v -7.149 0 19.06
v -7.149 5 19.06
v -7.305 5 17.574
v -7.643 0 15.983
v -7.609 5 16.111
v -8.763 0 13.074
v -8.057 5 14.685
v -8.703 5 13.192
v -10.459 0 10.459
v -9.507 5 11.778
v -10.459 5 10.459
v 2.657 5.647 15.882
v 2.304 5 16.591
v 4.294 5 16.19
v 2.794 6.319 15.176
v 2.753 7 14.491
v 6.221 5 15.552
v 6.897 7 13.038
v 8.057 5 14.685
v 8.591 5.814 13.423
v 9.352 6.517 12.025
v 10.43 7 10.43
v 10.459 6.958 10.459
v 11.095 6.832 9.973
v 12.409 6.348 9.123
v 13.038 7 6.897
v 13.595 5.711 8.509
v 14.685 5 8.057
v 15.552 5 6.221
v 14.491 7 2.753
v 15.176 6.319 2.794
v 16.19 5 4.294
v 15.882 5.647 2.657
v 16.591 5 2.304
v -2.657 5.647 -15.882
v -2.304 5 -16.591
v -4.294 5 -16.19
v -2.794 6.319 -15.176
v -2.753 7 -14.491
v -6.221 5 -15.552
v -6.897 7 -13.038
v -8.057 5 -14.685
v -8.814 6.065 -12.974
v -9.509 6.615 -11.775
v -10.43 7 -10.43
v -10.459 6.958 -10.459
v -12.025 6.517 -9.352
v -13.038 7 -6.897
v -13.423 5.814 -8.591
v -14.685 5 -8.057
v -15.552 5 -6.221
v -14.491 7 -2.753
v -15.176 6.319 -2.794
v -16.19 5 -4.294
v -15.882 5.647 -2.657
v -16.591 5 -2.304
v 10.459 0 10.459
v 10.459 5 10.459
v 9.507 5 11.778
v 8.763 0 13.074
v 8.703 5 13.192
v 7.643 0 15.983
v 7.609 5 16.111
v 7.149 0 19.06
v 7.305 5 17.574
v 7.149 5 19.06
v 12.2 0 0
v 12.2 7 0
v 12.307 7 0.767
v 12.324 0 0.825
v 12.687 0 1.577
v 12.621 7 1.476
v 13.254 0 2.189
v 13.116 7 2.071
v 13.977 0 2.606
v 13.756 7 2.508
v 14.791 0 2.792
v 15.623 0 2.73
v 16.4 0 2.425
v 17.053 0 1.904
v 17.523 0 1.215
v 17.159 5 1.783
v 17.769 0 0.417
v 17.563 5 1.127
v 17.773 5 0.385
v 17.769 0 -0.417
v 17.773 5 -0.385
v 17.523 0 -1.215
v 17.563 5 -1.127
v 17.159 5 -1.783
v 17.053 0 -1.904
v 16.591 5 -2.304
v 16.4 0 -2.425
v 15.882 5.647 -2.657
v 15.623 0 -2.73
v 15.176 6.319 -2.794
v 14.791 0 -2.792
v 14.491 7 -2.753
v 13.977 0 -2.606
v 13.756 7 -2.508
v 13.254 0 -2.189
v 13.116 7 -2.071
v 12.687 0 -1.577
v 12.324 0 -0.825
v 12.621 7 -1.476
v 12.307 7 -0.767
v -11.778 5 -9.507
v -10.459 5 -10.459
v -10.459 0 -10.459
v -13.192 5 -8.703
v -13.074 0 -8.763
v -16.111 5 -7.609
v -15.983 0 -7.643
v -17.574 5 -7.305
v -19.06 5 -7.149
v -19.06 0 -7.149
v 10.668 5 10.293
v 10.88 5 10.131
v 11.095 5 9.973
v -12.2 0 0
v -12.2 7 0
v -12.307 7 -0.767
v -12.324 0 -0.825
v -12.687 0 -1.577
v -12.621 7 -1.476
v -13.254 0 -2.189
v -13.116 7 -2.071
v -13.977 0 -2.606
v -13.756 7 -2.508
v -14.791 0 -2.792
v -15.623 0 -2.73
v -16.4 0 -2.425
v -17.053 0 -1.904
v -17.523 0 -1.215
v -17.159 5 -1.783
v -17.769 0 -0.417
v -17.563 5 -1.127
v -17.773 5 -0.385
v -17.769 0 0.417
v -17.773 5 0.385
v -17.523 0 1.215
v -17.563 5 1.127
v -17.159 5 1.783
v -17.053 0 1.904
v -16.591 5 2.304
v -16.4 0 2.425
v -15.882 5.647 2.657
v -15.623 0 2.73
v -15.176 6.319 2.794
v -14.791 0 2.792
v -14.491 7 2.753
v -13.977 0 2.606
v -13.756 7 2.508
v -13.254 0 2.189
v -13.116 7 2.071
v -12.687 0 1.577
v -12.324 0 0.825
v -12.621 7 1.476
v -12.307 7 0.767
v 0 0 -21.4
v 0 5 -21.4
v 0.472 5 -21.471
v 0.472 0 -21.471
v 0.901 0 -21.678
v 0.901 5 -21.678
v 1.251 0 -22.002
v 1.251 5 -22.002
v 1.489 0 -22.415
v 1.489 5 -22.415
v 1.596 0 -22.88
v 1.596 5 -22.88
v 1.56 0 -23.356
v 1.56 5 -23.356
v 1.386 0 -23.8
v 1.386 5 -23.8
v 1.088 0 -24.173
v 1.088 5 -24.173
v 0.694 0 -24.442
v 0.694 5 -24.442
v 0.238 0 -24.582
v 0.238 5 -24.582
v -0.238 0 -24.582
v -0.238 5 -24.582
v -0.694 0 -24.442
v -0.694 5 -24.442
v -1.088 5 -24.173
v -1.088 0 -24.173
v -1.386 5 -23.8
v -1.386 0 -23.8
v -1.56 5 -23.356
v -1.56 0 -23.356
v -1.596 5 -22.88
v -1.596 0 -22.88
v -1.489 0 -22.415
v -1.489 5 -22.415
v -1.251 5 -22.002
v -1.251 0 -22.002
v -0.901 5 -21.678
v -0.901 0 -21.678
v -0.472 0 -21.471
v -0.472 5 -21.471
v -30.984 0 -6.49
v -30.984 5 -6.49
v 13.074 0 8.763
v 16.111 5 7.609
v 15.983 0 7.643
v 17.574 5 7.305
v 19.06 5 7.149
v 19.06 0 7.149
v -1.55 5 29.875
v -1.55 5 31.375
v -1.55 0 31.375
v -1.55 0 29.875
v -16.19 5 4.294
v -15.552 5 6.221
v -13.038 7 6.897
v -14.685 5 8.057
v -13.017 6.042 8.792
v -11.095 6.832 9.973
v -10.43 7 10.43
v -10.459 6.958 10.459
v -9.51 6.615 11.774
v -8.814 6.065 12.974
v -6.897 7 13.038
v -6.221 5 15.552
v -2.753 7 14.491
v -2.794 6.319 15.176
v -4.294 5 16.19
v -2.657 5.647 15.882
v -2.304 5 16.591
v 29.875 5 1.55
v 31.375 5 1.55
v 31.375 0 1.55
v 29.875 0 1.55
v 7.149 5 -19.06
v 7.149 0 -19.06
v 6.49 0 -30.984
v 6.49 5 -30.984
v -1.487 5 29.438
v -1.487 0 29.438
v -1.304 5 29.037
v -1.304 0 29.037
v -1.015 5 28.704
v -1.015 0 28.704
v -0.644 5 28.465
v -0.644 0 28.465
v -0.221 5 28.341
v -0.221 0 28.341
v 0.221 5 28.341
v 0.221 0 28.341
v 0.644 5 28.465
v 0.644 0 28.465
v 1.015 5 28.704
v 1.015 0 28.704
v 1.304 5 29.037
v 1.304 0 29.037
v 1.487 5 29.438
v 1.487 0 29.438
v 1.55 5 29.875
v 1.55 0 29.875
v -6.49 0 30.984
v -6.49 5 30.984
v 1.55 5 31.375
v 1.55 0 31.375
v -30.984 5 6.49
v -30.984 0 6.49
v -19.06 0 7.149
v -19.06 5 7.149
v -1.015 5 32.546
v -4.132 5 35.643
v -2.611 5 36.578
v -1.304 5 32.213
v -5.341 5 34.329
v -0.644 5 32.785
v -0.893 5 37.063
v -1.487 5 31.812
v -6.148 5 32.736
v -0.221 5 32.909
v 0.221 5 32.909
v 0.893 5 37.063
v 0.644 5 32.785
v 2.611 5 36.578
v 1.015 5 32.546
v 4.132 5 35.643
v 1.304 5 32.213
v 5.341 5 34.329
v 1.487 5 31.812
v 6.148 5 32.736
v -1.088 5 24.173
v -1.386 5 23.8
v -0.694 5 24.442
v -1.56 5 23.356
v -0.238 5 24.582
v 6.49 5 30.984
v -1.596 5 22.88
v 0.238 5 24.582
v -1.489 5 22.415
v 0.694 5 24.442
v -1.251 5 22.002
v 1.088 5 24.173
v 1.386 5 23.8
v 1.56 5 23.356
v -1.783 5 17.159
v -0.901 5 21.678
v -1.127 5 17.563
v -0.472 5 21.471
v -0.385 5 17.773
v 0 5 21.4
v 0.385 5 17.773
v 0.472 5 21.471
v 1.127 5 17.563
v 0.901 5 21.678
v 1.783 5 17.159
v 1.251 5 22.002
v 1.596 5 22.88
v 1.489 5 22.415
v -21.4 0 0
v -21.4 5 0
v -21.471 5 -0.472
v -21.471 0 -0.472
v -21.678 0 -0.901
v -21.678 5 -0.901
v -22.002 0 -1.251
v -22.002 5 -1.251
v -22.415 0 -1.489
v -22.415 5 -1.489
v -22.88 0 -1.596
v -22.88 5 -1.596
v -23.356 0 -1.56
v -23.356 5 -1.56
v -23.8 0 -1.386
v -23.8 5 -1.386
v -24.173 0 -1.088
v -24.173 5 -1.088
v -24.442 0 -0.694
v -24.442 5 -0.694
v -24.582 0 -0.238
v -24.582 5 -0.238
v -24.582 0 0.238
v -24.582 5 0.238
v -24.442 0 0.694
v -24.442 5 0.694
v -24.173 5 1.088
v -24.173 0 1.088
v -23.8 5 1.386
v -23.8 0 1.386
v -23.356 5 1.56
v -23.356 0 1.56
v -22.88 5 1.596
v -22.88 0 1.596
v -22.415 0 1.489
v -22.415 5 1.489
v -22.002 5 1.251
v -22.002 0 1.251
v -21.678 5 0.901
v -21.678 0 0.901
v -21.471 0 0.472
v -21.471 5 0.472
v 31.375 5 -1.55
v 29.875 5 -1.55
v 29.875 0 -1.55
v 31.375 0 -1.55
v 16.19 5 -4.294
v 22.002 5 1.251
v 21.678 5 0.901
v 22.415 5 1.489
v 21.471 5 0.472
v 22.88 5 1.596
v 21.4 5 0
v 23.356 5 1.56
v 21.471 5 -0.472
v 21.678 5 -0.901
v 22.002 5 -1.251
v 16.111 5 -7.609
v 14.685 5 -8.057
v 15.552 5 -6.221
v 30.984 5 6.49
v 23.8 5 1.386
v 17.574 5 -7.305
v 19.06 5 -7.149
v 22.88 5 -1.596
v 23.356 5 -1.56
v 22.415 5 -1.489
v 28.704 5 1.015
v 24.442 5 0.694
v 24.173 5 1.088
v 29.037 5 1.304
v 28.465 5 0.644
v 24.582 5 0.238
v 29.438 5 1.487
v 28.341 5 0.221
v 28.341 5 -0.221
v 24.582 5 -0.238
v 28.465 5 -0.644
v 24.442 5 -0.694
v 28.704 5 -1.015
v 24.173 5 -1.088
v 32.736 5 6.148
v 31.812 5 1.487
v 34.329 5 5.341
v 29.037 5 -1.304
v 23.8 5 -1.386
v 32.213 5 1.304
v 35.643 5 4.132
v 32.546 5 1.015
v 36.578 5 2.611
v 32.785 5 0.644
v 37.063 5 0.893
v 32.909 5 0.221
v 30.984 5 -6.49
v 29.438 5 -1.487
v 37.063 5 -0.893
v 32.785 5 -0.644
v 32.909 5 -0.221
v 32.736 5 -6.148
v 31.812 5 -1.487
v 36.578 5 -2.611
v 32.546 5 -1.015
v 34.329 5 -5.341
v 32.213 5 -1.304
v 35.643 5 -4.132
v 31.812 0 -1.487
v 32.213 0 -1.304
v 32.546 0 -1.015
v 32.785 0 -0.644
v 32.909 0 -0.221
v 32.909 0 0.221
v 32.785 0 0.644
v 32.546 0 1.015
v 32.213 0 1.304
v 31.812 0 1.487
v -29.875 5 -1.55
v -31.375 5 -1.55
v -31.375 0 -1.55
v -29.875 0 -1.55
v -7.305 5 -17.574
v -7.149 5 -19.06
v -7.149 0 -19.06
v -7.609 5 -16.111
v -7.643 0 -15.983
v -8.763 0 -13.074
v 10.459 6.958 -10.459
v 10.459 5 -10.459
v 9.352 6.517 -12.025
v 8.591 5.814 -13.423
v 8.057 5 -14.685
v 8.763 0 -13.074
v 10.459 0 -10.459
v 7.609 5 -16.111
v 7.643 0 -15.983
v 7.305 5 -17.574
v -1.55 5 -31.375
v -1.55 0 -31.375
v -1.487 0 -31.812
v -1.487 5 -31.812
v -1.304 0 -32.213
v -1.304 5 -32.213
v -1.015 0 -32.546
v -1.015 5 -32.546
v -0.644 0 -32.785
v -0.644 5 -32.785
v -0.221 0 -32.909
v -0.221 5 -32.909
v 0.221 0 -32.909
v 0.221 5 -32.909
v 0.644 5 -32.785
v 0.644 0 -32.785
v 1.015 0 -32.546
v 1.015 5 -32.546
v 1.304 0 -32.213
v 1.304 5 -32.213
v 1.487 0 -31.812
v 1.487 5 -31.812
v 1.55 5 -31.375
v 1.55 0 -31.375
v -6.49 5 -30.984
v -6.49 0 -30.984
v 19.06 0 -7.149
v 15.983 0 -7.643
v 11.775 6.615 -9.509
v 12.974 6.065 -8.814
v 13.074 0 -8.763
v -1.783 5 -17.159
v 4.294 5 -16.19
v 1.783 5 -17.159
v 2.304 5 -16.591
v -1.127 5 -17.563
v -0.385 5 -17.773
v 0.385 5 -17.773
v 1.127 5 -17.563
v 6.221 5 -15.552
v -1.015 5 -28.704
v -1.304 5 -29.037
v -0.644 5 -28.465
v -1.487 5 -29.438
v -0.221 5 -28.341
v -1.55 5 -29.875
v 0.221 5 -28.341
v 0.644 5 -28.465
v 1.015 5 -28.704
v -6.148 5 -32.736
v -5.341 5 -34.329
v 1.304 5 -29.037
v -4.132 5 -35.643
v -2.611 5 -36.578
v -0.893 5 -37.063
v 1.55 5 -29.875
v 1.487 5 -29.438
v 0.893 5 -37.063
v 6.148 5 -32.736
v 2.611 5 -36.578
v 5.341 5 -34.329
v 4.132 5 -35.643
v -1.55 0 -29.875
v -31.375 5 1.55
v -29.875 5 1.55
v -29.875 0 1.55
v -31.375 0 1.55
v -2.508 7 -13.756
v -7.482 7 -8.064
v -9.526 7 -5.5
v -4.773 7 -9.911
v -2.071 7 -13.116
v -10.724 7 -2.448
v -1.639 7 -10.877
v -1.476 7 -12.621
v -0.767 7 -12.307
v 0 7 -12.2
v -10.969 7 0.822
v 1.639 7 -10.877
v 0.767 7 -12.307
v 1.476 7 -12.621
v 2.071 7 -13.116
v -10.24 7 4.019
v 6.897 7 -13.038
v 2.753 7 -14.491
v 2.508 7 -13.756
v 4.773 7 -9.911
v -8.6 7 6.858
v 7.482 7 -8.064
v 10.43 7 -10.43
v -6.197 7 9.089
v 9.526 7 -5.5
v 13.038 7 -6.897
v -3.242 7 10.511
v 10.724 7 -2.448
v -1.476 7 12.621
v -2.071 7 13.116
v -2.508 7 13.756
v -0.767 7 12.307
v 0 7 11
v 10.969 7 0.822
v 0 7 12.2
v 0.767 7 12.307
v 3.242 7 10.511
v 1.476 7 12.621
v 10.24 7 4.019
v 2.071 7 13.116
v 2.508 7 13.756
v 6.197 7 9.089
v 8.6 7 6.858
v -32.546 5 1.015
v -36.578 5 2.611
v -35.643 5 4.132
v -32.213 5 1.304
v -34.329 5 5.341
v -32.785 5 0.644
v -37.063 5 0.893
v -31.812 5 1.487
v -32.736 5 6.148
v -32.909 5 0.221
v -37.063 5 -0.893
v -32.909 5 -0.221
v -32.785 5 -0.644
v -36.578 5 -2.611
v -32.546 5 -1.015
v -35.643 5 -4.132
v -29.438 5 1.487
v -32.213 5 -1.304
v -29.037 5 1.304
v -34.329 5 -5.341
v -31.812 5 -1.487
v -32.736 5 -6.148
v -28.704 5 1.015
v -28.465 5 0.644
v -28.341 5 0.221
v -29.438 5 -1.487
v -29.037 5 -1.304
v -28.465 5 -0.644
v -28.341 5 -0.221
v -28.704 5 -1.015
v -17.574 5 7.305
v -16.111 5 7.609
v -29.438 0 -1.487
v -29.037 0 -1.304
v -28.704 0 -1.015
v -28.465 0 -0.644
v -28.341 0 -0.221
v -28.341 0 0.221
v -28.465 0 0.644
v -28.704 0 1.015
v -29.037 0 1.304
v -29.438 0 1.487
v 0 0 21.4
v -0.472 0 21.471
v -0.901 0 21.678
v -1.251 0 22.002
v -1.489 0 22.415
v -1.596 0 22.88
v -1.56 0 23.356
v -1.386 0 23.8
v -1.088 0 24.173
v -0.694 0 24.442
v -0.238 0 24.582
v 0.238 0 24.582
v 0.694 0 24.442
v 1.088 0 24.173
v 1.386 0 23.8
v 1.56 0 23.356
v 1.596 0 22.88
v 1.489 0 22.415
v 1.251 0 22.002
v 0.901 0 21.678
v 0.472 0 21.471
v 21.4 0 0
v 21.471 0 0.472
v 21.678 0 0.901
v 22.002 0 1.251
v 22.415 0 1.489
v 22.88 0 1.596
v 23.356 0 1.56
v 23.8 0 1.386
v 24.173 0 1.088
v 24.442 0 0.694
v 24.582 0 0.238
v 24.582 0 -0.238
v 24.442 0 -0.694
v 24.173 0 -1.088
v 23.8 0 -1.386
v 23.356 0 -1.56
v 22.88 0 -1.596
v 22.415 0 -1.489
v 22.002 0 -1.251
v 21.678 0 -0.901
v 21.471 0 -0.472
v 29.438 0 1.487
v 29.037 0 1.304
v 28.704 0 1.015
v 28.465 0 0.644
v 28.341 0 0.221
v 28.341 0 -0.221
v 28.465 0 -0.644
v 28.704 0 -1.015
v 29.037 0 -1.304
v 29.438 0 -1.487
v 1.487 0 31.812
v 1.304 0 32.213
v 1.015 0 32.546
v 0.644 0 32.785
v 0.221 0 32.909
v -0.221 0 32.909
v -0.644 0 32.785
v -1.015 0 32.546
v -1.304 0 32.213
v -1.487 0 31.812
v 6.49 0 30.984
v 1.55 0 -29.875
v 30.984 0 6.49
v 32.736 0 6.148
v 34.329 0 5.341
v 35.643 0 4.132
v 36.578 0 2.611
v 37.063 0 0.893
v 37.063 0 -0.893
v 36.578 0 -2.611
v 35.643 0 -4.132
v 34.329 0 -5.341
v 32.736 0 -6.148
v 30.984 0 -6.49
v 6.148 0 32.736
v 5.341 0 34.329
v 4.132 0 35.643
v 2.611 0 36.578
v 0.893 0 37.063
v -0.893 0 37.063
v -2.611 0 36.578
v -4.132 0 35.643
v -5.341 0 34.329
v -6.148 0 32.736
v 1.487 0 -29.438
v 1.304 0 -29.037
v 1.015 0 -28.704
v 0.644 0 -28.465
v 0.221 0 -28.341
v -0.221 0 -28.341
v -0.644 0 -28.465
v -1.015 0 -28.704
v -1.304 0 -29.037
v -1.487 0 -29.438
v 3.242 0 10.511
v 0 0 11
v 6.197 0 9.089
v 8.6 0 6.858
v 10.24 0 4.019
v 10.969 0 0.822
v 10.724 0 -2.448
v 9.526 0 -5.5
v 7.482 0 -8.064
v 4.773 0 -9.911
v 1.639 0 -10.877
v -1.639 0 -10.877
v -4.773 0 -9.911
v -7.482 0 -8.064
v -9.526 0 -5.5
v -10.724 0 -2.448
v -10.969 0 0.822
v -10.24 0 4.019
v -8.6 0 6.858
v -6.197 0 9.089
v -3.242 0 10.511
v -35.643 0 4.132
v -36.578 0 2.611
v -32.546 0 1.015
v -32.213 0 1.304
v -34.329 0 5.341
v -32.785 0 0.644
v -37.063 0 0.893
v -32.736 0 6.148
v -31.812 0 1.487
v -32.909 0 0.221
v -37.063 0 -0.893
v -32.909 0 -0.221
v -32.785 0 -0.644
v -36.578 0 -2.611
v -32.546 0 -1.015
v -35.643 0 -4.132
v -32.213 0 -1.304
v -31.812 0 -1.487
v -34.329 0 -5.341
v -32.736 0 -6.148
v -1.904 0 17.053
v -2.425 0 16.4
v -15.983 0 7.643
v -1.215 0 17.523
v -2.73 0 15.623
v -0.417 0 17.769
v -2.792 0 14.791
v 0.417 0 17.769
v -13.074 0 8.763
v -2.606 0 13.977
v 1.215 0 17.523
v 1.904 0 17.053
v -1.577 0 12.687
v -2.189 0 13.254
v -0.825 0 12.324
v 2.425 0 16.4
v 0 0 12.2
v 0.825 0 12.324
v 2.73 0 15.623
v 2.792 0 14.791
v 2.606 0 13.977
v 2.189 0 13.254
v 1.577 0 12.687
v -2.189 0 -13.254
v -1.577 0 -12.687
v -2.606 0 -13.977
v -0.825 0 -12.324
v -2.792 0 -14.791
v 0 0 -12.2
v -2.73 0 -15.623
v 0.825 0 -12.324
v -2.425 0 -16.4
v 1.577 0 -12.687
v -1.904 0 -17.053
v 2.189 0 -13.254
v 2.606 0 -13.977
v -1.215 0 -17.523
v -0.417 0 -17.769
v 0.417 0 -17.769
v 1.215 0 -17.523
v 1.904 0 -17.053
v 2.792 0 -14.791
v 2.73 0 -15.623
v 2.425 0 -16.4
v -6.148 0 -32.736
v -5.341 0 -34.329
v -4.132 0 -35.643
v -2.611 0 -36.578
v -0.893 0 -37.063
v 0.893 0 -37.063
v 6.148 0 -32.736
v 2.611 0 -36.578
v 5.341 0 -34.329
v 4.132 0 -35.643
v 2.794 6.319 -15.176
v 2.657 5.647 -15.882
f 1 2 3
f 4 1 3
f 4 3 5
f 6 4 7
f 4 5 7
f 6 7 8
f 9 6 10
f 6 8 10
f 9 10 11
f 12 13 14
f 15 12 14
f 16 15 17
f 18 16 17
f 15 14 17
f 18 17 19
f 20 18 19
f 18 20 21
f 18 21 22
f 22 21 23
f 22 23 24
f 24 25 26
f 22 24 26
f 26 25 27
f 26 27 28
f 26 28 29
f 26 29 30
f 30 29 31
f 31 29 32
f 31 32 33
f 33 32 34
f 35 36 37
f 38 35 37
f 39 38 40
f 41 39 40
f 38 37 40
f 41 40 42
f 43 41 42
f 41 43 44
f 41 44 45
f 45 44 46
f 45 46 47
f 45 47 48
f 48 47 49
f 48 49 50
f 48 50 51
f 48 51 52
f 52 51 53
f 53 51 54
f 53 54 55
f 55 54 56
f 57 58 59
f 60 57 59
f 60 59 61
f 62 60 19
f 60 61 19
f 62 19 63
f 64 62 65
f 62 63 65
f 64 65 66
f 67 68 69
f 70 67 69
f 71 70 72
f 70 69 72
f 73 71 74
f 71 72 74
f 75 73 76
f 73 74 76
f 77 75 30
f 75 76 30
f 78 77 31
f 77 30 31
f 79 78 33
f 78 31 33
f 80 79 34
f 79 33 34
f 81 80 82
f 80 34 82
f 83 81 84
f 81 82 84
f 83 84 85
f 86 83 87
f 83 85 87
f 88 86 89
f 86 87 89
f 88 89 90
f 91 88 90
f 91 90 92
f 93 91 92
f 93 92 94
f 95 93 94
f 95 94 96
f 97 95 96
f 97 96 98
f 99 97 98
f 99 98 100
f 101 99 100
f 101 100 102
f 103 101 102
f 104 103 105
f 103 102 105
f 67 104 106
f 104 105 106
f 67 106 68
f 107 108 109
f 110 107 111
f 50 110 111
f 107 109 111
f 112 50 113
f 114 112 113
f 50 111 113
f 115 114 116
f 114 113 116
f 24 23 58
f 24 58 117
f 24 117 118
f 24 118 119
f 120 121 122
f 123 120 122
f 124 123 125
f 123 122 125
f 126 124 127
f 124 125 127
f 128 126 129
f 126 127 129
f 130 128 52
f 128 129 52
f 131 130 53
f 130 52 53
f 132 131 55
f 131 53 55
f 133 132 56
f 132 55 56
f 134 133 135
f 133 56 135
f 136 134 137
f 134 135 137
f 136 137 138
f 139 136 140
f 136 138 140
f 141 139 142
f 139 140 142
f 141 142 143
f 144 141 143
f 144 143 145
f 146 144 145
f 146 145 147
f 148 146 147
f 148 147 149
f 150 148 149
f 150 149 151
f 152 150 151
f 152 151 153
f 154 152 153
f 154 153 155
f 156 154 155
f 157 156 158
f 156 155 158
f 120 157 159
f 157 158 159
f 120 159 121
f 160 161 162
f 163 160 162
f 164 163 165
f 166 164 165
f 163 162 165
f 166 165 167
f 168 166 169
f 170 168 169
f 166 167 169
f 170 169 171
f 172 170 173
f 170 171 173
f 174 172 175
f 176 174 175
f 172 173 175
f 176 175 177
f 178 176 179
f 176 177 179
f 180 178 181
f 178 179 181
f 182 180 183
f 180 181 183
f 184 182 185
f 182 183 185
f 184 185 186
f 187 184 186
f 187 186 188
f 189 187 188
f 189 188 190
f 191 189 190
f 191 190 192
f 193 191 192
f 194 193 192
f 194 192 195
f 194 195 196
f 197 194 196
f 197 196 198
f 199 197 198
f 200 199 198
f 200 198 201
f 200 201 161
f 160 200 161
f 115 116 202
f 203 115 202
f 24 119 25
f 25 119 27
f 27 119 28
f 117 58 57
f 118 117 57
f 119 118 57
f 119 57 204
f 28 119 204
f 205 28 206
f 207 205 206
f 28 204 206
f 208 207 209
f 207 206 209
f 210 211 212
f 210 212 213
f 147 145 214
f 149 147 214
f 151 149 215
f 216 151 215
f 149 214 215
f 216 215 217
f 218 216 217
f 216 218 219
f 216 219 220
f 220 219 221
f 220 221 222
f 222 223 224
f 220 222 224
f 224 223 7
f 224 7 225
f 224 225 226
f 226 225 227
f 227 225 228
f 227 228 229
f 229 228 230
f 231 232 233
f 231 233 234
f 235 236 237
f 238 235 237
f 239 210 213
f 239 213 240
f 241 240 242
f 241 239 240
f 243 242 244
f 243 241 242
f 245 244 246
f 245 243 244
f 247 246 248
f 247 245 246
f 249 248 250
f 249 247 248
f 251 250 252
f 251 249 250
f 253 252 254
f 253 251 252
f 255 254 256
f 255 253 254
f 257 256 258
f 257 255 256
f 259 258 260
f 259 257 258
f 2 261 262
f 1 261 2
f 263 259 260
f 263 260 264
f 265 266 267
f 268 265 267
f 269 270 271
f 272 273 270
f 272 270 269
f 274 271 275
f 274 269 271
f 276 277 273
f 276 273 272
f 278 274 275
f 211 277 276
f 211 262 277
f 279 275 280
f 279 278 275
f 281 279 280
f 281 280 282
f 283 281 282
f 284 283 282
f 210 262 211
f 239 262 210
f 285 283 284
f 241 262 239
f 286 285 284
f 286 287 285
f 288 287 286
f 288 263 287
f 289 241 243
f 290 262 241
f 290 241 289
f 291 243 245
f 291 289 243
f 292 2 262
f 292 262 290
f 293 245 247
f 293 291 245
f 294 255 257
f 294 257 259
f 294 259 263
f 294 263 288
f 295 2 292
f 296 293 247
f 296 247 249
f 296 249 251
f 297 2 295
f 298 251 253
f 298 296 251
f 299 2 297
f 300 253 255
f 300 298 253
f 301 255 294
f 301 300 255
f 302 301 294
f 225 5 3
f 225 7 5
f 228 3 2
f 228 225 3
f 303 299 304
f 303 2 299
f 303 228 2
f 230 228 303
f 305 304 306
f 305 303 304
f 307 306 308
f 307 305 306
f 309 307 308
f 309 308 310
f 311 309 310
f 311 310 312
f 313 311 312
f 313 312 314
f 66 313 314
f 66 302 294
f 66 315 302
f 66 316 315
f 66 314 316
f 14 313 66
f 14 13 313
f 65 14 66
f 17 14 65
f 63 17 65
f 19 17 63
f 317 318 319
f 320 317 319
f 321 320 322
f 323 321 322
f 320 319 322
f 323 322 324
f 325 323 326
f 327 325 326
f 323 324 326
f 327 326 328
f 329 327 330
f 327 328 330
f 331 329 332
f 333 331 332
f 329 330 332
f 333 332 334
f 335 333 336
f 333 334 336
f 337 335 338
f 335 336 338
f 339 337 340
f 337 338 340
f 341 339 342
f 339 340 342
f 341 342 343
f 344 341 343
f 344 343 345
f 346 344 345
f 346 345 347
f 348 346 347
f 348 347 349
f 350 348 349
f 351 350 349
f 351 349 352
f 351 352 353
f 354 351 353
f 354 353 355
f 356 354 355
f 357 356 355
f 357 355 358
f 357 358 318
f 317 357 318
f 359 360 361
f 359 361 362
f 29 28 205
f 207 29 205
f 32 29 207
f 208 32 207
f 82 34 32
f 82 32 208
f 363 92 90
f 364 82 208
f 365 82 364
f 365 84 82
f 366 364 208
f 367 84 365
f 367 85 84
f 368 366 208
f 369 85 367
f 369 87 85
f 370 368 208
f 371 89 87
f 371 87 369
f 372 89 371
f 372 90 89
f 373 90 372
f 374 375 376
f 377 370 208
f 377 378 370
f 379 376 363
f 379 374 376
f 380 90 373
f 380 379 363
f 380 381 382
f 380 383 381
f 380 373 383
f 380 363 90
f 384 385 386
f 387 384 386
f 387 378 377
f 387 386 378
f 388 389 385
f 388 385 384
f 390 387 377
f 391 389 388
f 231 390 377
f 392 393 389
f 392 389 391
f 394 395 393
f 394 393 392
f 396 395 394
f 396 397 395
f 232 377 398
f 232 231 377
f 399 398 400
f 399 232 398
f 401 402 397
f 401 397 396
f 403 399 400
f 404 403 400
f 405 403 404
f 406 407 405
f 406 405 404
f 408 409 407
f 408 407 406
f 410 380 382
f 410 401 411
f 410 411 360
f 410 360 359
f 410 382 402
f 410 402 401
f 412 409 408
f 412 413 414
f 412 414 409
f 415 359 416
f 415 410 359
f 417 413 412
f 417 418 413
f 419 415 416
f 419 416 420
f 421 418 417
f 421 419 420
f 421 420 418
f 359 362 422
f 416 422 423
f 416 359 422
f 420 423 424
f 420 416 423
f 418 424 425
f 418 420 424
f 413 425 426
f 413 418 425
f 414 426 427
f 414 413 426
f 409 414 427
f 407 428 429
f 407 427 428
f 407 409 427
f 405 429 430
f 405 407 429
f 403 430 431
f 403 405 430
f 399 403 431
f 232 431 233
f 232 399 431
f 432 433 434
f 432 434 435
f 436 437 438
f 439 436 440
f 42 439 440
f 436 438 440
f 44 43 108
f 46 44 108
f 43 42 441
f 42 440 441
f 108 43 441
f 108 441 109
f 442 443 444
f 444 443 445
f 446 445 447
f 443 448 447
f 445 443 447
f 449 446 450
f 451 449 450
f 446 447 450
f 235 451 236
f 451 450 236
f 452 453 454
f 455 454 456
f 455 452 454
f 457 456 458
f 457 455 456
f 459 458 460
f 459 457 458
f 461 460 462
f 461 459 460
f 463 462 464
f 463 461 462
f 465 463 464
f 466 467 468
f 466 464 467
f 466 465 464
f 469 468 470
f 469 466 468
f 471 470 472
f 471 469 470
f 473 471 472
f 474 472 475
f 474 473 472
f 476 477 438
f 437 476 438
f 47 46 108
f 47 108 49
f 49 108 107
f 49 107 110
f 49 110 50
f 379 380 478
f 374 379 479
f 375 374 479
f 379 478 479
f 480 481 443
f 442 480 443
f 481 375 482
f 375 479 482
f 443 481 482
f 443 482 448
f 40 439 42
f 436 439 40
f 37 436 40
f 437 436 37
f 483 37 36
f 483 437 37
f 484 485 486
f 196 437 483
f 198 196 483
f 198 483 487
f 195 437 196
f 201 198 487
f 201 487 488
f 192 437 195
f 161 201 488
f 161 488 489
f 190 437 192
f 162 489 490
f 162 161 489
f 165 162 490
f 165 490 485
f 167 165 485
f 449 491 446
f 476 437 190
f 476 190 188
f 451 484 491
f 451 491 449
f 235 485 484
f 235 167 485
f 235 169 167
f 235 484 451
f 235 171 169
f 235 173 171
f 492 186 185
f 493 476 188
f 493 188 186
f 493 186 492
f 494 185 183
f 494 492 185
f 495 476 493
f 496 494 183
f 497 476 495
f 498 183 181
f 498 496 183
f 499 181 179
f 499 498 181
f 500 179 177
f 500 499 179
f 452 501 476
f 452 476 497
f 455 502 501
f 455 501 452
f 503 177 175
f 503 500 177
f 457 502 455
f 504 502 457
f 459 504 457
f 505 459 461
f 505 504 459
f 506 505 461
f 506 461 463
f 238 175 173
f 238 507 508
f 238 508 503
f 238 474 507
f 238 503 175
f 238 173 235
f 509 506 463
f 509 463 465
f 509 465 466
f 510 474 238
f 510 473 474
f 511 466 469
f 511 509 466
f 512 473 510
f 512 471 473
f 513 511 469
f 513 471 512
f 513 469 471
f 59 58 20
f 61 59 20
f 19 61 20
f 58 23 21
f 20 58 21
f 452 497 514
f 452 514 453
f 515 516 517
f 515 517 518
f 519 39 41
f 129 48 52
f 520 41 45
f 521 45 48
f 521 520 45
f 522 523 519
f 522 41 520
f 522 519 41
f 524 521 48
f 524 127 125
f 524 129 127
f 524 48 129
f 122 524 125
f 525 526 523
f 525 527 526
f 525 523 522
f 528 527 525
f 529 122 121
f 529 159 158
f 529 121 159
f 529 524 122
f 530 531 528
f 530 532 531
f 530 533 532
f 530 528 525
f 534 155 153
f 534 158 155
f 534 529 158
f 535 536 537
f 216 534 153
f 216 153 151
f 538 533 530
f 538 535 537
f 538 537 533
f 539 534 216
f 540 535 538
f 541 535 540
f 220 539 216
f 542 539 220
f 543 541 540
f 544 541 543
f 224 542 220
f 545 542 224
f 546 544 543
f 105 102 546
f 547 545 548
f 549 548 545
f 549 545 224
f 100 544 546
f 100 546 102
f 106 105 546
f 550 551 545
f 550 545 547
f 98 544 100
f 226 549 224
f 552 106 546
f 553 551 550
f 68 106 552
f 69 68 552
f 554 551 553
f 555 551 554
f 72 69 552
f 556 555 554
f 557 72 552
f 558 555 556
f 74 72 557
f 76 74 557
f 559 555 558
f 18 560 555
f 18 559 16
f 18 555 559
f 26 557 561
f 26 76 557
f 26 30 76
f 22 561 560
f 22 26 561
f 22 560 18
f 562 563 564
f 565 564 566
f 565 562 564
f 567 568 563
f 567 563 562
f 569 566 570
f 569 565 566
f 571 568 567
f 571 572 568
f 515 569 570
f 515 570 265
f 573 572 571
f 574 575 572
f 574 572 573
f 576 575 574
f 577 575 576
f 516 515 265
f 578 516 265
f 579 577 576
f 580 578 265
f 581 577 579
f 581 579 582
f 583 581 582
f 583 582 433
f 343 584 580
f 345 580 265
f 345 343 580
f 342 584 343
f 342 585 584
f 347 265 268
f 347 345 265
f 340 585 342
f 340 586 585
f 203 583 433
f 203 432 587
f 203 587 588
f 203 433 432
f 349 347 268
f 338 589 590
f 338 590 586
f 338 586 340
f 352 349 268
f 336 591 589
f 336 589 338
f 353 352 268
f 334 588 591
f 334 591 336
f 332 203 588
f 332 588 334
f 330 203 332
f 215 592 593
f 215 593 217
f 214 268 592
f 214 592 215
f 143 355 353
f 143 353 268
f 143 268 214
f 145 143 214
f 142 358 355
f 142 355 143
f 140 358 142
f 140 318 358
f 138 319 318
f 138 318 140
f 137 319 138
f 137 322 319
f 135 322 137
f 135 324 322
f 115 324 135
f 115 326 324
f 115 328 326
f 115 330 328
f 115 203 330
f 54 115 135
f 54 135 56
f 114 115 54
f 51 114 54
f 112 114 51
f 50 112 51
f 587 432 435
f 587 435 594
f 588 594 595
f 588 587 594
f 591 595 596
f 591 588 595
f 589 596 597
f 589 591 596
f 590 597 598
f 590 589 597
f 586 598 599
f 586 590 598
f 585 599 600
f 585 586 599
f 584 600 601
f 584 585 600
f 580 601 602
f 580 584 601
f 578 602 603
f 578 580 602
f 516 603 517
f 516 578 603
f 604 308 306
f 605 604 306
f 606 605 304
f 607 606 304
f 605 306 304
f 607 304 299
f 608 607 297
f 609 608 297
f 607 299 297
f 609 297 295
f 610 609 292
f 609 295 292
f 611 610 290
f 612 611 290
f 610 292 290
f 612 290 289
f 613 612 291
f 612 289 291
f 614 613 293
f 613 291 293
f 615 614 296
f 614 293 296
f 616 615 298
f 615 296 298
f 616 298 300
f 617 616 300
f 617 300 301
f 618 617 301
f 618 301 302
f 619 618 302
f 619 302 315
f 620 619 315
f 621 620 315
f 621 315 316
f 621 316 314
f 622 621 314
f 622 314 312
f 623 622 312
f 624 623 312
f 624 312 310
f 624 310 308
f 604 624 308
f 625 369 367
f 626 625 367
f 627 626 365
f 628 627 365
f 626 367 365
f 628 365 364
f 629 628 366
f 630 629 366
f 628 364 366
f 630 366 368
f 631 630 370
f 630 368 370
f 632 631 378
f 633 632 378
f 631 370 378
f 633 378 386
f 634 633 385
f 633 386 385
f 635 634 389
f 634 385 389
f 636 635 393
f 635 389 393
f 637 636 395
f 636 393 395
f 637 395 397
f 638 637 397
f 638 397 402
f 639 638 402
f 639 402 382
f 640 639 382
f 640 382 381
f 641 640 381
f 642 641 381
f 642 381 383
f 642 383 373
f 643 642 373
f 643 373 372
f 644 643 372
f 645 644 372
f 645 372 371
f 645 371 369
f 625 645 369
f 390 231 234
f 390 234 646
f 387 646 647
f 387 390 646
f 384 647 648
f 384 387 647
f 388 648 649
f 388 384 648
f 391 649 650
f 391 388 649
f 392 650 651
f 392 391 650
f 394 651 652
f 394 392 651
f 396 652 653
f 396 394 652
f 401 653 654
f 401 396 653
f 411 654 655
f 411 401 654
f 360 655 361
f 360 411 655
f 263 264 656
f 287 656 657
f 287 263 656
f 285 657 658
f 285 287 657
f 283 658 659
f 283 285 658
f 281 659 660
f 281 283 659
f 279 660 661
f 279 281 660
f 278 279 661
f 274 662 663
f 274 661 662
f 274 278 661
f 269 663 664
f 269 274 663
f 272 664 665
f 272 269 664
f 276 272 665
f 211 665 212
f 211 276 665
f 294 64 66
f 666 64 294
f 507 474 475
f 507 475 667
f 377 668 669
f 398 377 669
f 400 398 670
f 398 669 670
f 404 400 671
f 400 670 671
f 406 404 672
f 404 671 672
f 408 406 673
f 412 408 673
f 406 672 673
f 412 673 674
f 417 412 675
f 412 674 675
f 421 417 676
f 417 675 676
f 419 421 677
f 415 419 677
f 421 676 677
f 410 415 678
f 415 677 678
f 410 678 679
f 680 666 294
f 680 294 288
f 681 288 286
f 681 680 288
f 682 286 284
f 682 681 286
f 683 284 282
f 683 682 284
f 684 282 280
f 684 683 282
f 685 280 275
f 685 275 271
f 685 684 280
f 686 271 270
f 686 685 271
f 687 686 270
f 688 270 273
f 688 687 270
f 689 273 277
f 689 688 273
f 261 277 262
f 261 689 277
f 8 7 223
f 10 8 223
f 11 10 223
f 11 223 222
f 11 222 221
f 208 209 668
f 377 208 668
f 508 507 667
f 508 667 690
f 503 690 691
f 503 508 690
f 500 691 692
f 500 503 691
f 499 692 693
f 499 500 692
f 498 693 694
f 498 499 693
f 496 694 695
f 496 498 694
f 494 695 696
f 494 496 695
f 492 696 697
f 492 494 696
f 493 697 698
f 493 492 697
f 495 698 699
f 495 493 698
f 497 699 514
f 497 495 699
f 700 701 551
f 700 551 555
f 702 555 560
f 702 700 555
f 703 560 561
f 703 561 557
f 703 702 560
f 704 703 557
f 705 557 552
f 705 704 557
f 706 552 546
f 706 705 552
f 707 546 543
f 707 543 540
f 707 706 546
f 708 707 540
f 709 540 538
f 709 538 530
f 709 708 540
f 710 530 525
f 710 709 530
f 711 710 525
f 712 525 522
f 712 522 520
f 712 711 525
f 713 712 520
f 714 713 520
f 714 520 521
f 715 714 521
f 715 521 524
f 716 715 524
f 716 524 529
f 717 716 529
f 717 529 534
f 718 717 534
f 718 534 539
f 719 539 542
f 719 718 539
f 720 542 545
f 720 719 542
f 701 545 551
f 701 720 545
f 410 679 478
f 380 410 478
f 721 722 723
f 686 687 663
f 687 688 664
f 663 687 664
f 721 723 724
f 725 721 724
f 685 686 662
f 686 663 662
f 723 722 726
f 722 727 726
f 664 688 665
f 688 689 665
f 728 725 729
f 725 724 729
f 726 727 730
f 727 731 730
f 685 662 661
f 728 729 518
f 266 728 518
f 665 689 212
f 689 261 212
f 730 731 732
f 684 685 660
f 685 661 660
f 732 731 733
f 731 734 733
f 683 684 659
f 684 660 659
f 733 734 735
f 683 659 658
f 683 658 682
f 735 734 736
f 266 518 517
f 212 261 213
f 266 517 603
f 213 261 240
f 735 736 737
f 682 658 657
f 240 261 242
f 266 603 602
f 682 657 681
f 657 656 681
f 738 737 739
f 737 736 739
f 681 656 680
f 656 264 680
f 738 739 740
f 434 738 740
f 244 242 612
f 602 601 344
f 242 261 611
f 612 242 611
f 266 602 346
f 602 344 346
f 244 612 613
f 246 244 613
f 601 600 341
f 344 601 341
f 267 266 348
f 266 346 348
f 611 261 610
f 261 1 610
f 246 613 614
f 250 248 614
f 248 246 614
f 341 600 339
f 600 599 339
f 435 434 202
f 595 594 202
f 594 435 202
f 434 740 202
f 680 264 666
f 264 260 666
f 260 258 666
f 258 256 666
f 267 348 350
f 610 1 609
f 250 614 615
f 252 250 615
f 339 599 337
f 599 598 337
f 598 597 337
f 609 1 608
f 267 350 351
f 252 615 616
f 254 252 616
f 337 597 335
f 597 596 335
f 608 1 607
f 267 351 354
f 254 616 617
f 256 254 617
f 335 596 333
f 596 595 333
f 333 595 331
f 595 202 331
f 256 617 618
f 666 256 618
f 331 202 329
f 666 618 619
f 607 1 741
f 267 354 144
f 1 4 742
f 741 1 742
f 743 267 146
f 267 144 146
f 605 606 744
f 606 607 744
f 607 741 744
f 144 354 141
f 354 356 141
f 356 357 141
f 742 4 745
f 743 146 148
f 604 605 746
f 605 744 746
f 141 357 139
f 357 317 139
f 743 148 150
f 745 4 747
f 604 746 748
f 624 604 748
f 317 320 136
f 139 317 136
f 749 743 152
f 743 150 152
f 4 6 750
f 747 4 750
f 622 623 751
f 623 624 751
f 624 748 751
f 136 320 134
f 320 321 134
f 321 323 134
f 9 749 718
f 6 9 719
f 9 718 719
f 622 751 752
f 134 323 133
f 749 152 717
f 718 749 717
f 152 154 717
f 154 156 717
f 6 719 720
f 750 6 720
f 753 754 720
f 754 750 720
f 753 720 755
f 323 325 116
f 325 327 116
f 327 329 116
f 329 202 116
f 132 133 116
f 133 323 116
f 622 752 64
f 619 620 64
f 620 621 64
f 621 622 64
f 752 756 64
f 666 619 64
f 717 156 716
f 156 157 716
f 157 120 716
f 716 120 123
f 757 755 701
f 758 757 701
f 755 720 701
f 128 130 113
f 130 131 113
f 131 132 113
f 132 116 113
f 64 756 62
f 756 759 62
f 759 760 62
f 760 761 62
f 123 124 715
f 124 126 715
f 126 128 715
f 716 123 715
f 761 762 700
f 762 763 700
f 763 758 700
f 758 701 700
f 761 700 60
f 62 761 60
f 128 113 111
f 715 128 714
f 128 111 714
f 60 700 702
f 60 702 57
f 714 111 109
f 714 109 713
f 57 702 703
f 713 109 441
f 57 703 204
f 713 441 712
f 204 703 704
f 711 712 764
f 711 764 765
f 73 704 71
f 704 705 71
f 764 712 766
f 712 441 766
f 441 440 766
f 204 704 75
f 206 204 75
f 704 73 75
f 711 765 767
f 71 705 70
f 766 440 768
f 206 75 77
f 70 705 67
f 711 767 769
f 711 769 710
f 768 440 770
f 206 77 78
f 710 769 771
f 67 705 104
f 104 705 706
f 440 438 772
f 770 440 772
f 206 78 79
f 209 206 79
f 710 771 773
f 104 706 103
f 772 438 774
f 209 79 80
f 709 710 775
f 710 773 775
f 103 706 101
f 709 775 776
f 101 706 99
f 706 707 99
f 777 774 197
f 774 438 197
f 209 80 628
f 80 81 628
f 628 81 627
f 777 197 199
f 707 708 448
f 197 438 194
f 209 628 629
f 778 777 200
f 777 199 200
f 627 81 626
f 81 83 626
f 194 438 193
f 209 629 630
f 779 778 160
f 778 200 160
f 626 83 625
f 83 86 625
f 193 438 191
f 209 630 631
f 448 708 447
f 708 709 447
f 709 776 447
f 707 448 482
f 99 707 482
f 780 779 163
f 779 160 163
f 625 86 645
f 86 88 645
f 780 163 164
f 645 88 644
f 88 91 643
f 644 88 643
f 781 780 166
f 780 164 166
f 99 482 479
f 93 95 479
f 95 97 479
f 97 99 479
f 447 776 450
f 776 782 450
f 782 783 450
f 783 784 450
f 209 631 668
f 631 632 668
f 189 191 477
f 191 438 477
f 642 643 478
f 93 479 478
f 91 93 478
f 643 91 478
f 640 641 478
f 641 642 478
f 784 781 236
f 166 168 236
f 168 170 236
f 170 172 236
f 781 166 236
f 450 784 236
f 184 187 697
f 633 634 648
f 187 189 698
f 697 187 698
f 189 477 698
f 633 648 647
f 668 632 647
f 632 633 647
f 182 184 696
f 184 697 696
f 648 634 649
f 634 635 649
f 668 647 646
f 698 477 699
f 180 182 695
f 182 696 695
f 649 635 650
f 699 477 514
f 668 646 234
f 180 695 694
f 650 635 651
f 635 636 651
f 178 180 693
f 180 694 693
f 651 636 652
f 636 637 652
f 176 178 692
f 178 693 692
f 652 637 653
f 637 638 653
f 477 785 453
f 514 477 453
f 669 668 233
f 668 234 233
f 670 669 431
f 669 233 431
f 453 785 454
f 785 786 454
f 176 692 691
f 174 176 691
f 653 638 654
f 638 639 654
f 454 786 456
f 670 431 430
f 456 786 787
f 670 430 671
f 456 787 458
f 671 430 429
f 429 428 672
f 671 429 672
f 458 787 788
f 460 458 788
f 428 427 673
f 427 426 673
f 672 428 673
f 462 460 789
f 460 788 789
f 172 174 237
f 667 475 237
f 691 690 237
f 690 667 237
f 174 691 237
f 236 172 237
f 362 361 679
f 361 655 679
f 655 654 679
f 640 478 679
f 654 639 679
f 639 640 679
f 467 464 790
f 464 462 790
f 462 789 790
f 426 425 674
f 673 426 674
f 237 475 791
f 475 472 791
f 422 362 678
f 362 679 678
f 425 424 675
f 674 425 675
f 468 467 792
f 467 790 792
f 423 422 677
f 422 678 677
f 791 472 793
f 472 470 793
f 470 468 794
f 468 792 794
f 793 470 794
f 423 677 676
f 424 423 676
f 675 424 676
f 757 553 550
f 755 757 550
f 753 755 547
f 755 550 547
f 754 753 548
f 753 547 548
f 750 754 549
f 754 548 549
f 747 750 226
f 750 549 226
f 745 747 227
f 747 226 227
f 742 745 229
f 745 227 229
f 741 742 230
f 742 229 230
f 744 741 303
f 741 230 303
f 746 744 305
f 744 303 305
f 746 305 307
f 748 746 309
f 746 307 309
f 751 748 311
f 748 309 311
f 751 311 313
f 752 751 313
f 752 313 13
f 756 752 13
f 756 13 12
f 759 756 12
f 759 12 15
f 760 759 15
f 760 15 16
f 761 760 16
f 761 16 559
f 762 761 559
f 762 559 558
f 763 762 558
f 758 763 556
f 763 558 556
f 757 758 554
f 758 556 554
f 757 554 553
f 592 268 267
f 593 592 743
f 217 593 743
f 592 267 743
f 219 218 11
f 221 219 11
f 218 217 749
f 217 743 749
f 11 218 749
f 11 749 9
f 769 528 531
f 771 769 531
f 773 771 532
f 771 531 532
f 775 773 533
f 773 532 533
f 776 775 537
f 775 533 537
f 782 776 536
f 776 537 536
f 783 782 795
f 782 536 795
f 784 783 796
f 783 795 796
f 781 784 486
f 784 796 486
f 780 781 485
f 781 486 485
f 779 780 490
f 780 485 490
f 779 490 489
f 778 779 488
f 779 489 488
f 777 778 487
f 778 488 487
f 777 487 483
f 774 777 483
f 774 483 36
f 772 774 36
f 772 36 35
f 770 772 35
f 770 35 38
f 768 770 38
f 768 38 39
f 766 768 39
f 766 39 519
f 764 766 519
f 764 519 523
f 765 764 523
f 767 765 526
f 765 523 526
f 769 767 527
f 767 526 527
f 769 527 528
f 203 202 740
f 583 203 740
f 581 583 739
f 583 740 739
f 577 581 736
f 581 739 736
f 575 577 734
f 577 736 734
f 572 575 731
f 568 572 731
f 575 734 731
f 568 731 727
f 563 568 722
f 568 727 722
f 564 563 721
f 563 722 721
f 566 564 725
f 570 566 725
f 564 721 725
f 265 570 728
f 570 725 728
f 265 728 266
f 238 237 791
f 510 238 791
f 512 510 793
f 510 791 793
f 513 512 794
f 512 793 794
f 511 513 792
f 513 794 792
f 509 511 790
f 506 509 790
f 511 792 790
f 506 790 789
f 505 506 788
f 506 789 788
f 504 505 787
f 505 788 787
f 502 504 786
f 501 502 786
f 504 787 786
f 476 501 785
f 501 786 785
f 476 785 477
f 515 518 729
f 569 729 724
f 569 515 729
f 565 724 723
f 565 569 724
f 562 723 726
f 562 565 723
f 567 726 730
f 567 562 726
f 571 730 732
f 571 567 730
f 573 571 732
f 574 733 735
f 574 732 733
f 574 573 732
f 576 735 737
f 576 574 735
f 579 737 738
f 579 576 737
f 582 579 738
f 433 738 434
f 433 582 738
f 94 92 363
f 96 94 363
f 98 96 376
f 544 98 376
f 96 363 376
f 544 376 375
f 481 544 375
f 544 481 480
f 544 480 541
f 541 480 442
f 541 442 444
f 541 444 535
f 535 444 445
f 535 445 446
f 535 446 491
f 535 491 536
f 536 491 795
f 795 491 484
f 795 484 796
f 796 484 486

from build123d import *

# Parameters (mm, degrees)
SKETCH1_R           = 14.75
SKETCH1_R_2         = 11
BOSS_EXTRUDE1_DEPTH = 7
SKETCH5_R           = 6.5
BOSS_EXTRUDE3_DEPTH = 5
FILLET2_R           = 15
CIRPATTERN2_DEPTH   = 5
CHAMFER2_SIZE       = 2
CUT_EXTRUDE3_REACH  = 54.74
CIRPATTERN4_COUNT   = 4
CUT_EXTRUDE4_REACH  = 54.967
SKETCH9_R           = 2.8
CIRPATTERN5_COUNT   = 4
CUT_EXTRUDE5_REACH  = 54.74
SKETCH10_R          = 1.6
CIRPATTERN6_COUNT   = 4


# Read off the part's stored shape, not the designer's step: CirPattern2
with BuildPart() as part:
    # Sketch1 → Boss-Extrude1 (new body)
    with BuildSketch(Plane(origin=(0, 0, 0), x_dir=(1, 0, 0), z_dir=(0, 1, 0))):
        with Locations(Location((0, 0, 0), (0, 0, 270))):
            Circle(SKETCH1_R)
        with Locations(Location((0, 0, 0), (0, 0, 270))):
            Circle(SKETCH1_R_2, mode=Mode.SUBTRACT)
    extrude(amount=BOSS_EXTRUDE1_DEPTH)

    # Sketch5 → Boss-Extrude3 (add)
    with BuildSketch(Plane.XZ):
        with BuildLine():
            ThreePointArc((6.5, 30.625), (-0.17931828, 24.127473936), (-6.49010614, 30.983500062))
            Line((-6.49010614, 30.983500062), (-7.5, 12.700885796))
            ThreePointArc((-7.5, 12.700885796), (0, 14.75), (7.5, 12.700885796))
            Line((7.5, 12.700885796), (6.49010614, 30.983500062))
            ThreePointArc((6.49010614, 30.983500062), (6.497526064, 30.80431828), (6.5, 30.625))
        make_face()
        with Locations((0, 30.625)):
            Circle(SKETCH5_R)
    extrude(amount=-BOSS_EXTRUDE3_DEPTH)

    # Fillet2
    fillet2_edges = [part.edges().sort_by_distance(p)[0] for p in [
        (7.5, 2.5, 12.700885796),
        (-7.5, 2.5, 12.700885796),
    ]]
    fillet(fillet2_edges, radius=FILLET2_R)

    # CirPattern2 outline → CirPattern2 (add)
    with BuildSketch(Plane(origin=(0, 0, 0), x_dir=(1, 0, 0), z_dir=(0, 1, 0))):
        with BuildLine():
            Line((-30.983500062, -6.49010614), (-19.060050189, -7.14873289))
            ThreePointArc((-19.060050189, -7.14873289), (-14.499104834, -8.127089257), (-10.459249152, -10.459249152))
            ThreePointArc((-10.459249152, -10.459249152), (-10.710685451, -10.156332582), (-10.969984482, -9.860118684))
            ThreePointArc((-10.969984482, -9.860118684), (0, 14.75), (10.969984482, -9.860118684))
            ThreePointArc((10.969984482, -9.860118684), (10.710685451, -10.156332582), (10.459249152, -10.459249152))
            ThreePointArc((10.459249152, -10.459249152), (14.499104834, -8.127089257), (19.060050189, -7.14873289))
            Line((19.060050189, -7.14873289), (30.983500062, -6.49010614))
            ThreePointArc((30.983500062, -6.49010614), (37.125, 0), (30.983500062, 6.49010614))
            Line((30.983500062, 6.49010614), (19.060050189, 7.14873289))
            ThreePointArc((19.060050189, 7.14873289), (14.499104834, 8.127089257), (10.459249152, 10.459249152))
            ThreePointArc((10.459249152, 10.459249152), (8.127089257, 14.499104834), (7.14873289, 19.060050189))
            Line((7.14873289, 19.060050189), (6.49010614, 30.983500062))
            ThreePointArc((6.49010614, 30.983500062), (0, 37.125), (-6.49010614, 30.983500062))
            Line((-6.49010614, 30.983500062), (-7.14873289, 19.060050189))
            ThreePointArc((-7.14873289, 19.060050189), (-8.127089257, 14.499104834), (-10.459249152, 10.459249152))
            ThreePointArc((-10.459249152, 10.459249152), (-14.499104834, 8.127089257), (-19.060050189, 7.14873289))
            Line((-19.060050189, 7.14873289), (-30.983500062, 6.49010614))
            ThreePointArc((-30.983500062, 6.49010614), (-37.125, 0), (-30.983500062, -6.49010614))
        make_face()
    extrude(amount=CIRPATTERN2_DEPTH)

    # Chamfer2
    # the kernel refuses this chamfer: 2 mm, written as the material it adds along each edge
    with BuildSketch(Plane(origin=(0, 5, 0), x_dir=(-0.7437277614936905, 0, 0.6684826226489246), z_dir=(0.6684826226489246, 0, 0.7437277614936905))) as chamfer2_piece_1_section:
        Polygon((14.75, -CHAMFER2_SIZE), (14.75 + CHAMFER2_SIZE, 0), (14.75, 0), align=None)
    chamfer2_piece_1 = revolve(axis=Axis((0, 5, 0), (0, -1, 0)), revolution_arc=263.900121289, mode=Mode.PRIVATE)
    chamfer2_piece_1 = chamfer2_piece_1 - Plane(origin=(-19.887358028, 5.976556714, 22.125900918), x_dir=(0.055153855863411774, 0, -0.998477867648251), z_dir=(0, -1, 0)) * Cylinder(15.000000014, 67, mode=Mode.PRIVATE)
    chamfer2_piece_1 = chamfer2_piece_1 - Plane(origin=(19.887358028, 5.976556714, 22.125900918), x_dir=(-0.62854059114179, 0, -0.7777767837156939), z_dir=(0, -1, 0)) * Cylinder(15.000000014, 67, mode=Mode.PRIVATE)
    chamfer2_piece_1 = chamfer2_piece_1 - Plane(origin=(22.125900918, 5.976556714, -19.887358028), x_dir=(-0.7777767837156939, 0, 0.62854059114179), z_dir=(0, -1, 0)) * Cylinder(15.000000014, 67, mode=Mode.PRIVATE)
    chamfer2_piece_1 = chamfer2_piece_1 - Plane(origin=(-19.887358028, 5.976556714, -22.125900918), x_dir=(0.62854059114179, 0, 0.7777767837156939), z_dir=(0, -1, 0)) * Cylinder(15.000000014, 67, mode=Mode.PRIVATE)
    add(chamfer2_piece_1)
    with BuildSketch(Plane(origin=(0, 5, 0), x_dir=(-0.7437277614936905, 0, 0.6684826226489246), z_dir=(0.6684826226489246, 0, 0.7437277614936905))) as chamfer2_piece_2_section:
        Polygon((14.75, -CHAMFER2_SIZE), (14.75 + CHAMFER2_SIZE, 0), (14.75, 0), align=None)
    chamfer2_piece_2 = revolve(axis=Axis((0, 5, 0), (0, -1, 0)), revolution_arc=263.900121289, mode=Mode.PRIVATE)
    chamfer2_piece_2 = chamfer2_piece_2 - Plane(origin=(-19.887358028, 5.654995073, 22.125900918), x_dir=(0.055153855863411774, 0, -0.998477867648251), z_dir=(0, -1, 0)) * Cylinder(15.000000014, 67, mode=Mode.PRIVATE)
    chamfer2_piece_2 = chamfer2_piece_2 - Plane(origin=(19.887358028, 5.654995073, 22.125900918), x_dir=(-0.62854059114179, 0, -0.7777767837156939), z_dir=(0, -1, 0)) * Cylinder(15.000000014, 67, mode=Mode.PRIVATE)
    chamfer2_piece_2 = chamfer2_piece_2 - Plane(origin=(19.887358028, 5.654995073, -22.125900918), x_dir=(-0.055153855863411774, 0, 0.998477867648251), z_dir=(0, -1, 0)) * Cylinder(15.000000014, 67, mode=Mode.PRIVATE)
    chamfer2_piece_2 = chamfer2_piece_2 - Plane(origin=(-22.125900918, 5.654995073, -19.887358028), x_dir=(0.998477867648251, 0, 0.055153855863411774), z_dir=(0, -1, 0)) * Cylinder(15.000000014, 67, mode=Mode.PRIVATE)
    add(chamfer2_piece_2)
    with BuildSketch(Plane(origin=(0, 5, 0), x_dir=(0, 0, 1), z_dir=(-1, 0, 0))) as chamfer2_piece_3_section:
        Polygon((14.75, CHAMFER2_SIZE), (14.75 + CHAMFER2_SIZE, 0), (14.75, 0), align=None)
    chamfer2_piece_3 = revolve(axis=Axis((0, 5, 0), (0, 1, 0)), revolution_arc=48.049939357, mode=Mode.PRIVATE)
    chamfer2_piece_3 = chamfer2_piece_3 - Plane(origin=(22.125900905, 5.691339401, 19.887358023), x_dir=(-0.7437277615096491, 0, -0.6684826226311694), z_dir=(0, 1, 0)) * Cylinder(15, 68, mode=Mode.PRIVATE)
    add(chamfer2_piece_3)
    with BuildSketch(Plane(origin=(0, 5, 0), x_dir=(0, 0, 1), z_dir=(-1, 0, 0))) as chamfer2_piece_4_section:
        Polygon((14.75, CHAMFER2_SIZE), (14.75 + CHAMFER2_SIZE, 0), (14.75, 0), align=None)
    chamfer2_piece_4 = revolve(axis=Axis((0, 5, 0), (0, 1, 0)), revolution_arc=48.049939357, mode=Mode.PRIVATE)
    chamfer2_piece_4 = chamfer2_piece_4 - Plane(origin=(19.887358028, 5.96883772, 22.125900918), x_dir=(-0.62854059114179, 0, -0.7777767837156939), z_dir=(0, -1, 0)) * Cylinder(15.000000014, 68, mode=Mode.PRIVATE)
    add(chamfer2_piece_4)
    with BuildSketch(Plane(origin=(0, 5, 0), x_dir=(-0.743727761509649, 0, 0.6684826226311695), z_dir=(-0.6684826226311695, 0, -0.743727761509649))) as chamfer2_piece_5_section:
        Polygon((14.75, CHAMFER2_SIZE), (14.75 + CHAMFER2_SIZE, 0), (14.75, 0), align=None)
    chamfer2_piece_5 = revolve(axis=Axis((0, 5, 0), (0, 1, 0)), revolution_arc=48.049939357, mode=Mode.PRIVATE)
    chamfer2_piece_5 = chamfer2_piece_5 - Plane(origin=(-22.125900905, 5.99378233, 19.887358023), x_dir=(0.7437277615096493, 0, -0.6684826226311694), z_dir=(0, 1, 0)) * Cylinder(15, 67, mode=Mode.PRIVATE)
    add(chamfer2_piece_5)
    with BuildSketch(Plane(origin=(0, 5, 0), x_dir=(-0.743727761509649, 0, 0.6684826226311695), z_dir=(-0.6684826226311695, 0, -0.743727761509649))) as chamfer2_piece_6_section:
        Polygon((14.75, CHAMFER2_SIZE), (14.75 + CHAMFER2_SIZE, 0), (14.75, 0), align=None)
    chamfer2_piece_6 = revolve(axis=Axis((0, 5, 0), (0, 1, 0)), revolution_arc=48.049939357, mode=Mode.PRIVATE)
    chamfer2_piece_6 = chamfer2_piece_6 - Plane(origin=(-19.887358028, 5.968837515, 22.125900918), x_dir=(0.055153855863411774, 0, -0.998477867648251), z_dir=(0, -1, 0)) * Cylinder(15.000000014, 67, mode=Mode.PRIVATE)
    add(chamfer2_piece_6)

    # Sketch8 → Cut-Extrude3 (cut, up to next)
    with BuildSketch(Plane(origin=(0, 5, 0), x_dir=(1, 0, 0), z_dir=(0, 1, 0)), mode=Mode.PRIVATE) as cut_extrude3_sk1:
        with BuildLine():
            Line((-1.55, 29.875), (-1.55, 31.375))
            ThreePointArc((-1.55, 31.375), (0, 32.925), (1.55, 31.375))
            Line((1.55, 31.375), (1.55, 29.875))
            ThreePointArc((1.55, 29.875), (0, 28.325), (-1.55, 29.875))
        make_face()
    cut_extrude3_tool1 = extrude(cut_extrude3_sk1.sketch, amount=-CUT_EXTRUDE3_REACH, mode=Mode.PRIVATE) & part.part
    cut_extrude3 = cut_extrude3_tool1.solids().sort_by_distance((0, 5, -30.625))[0]
    add(cut_extrude3, mode=Mode.SUBTRACT)

    # CirPattern4: Cut-Extrude3 ×4 about axis
    cirpattern4_axis = Axis((0, 0, 0), (0, 1, 0))
    for i in range(1, CIRPATTERN4_COUNT):
        add(cut_extrude3.rotate(cirpattern4_axis, i * 360 / CIRPATTERN4_COUNT), mode=Mode.SUBTRACT)

    # Sketch9 → Cut-Extrude4 (cut, up to next)
    with BuildSketch(Plane(origin=(0, 7, 0), x_dir=(1, 0, 0), z_dir=(0, 1, 0)), mode=Mode.PRIVATE) as cut_extrude4_sk1:
        with Locations(Location((0, 15, 0), (0, 0, 270))):
            Circle(SKETCH9_R)
    cut_extrude4_tool1 = extrude(cut_extrude4_sk1.sketch, amount=-CUT_EXTRUDE4_REACH, mode=Mode.PRIVATE) & part.part
    cut_extrude4 = cut_extrude4_tool1.solids().sort_by_distance((0, 7, -15))[0]
    add(cut_extrude4, mode=Mode.SUBTRACT)

    # CirPattern5: Cut-Extrude4 ×4 about axis
    cirpattern5_axis = Axis((0, 0, 0), (0, 1, 0))
    for i in range(1, CIRPATTERN5_COUNT):
        add(cut_extrude4.rotate(cirpattern5_axis, i * 360 / CIRPATTERN5_COUNT), mode=Mode.SUBTRACT)

    # Sketch10 → Cut-Extrude5 (cut, up to next)
    with BuildSketch(Plane(origin=(0, 5, 0), x_dir=(1, 0, 0), z_dir=(0, 1, 0)), mode=Mode.PRIVATE) as cut_extrude5_sk1:
        with Locations(Location((0, 23, 0), (0, 0, 270))):
            Circle(SKETCH10_R)
    cut_extrude5_tool1 = extrude(cut_extrude5_sk1.sketch, amount=-CUT_EXTRUDE5_REACH, mode=Mode.PRIVATE) & part.part
    cut_extrude5 = cut_extrude5_tool1.solids().sort_by_distance((0, 5, -23))[0]
    add(cut_extrude5, mode=Mode.SUBTRACT)

    # CirPattern6: Cut-Extrude5 ×4 about axis
    cirpattern6_axis = Axis((0, 0, 0), (0, 1, 0))
    for i in range(1, CIRPATTERN6_COUNT):
        add(cut_extrude5.rotate(cirpattern6_axis, i * 360 / CIRPATTERN6_COUNT), mode=Mode.SUBTRACT)


solid = part.part
